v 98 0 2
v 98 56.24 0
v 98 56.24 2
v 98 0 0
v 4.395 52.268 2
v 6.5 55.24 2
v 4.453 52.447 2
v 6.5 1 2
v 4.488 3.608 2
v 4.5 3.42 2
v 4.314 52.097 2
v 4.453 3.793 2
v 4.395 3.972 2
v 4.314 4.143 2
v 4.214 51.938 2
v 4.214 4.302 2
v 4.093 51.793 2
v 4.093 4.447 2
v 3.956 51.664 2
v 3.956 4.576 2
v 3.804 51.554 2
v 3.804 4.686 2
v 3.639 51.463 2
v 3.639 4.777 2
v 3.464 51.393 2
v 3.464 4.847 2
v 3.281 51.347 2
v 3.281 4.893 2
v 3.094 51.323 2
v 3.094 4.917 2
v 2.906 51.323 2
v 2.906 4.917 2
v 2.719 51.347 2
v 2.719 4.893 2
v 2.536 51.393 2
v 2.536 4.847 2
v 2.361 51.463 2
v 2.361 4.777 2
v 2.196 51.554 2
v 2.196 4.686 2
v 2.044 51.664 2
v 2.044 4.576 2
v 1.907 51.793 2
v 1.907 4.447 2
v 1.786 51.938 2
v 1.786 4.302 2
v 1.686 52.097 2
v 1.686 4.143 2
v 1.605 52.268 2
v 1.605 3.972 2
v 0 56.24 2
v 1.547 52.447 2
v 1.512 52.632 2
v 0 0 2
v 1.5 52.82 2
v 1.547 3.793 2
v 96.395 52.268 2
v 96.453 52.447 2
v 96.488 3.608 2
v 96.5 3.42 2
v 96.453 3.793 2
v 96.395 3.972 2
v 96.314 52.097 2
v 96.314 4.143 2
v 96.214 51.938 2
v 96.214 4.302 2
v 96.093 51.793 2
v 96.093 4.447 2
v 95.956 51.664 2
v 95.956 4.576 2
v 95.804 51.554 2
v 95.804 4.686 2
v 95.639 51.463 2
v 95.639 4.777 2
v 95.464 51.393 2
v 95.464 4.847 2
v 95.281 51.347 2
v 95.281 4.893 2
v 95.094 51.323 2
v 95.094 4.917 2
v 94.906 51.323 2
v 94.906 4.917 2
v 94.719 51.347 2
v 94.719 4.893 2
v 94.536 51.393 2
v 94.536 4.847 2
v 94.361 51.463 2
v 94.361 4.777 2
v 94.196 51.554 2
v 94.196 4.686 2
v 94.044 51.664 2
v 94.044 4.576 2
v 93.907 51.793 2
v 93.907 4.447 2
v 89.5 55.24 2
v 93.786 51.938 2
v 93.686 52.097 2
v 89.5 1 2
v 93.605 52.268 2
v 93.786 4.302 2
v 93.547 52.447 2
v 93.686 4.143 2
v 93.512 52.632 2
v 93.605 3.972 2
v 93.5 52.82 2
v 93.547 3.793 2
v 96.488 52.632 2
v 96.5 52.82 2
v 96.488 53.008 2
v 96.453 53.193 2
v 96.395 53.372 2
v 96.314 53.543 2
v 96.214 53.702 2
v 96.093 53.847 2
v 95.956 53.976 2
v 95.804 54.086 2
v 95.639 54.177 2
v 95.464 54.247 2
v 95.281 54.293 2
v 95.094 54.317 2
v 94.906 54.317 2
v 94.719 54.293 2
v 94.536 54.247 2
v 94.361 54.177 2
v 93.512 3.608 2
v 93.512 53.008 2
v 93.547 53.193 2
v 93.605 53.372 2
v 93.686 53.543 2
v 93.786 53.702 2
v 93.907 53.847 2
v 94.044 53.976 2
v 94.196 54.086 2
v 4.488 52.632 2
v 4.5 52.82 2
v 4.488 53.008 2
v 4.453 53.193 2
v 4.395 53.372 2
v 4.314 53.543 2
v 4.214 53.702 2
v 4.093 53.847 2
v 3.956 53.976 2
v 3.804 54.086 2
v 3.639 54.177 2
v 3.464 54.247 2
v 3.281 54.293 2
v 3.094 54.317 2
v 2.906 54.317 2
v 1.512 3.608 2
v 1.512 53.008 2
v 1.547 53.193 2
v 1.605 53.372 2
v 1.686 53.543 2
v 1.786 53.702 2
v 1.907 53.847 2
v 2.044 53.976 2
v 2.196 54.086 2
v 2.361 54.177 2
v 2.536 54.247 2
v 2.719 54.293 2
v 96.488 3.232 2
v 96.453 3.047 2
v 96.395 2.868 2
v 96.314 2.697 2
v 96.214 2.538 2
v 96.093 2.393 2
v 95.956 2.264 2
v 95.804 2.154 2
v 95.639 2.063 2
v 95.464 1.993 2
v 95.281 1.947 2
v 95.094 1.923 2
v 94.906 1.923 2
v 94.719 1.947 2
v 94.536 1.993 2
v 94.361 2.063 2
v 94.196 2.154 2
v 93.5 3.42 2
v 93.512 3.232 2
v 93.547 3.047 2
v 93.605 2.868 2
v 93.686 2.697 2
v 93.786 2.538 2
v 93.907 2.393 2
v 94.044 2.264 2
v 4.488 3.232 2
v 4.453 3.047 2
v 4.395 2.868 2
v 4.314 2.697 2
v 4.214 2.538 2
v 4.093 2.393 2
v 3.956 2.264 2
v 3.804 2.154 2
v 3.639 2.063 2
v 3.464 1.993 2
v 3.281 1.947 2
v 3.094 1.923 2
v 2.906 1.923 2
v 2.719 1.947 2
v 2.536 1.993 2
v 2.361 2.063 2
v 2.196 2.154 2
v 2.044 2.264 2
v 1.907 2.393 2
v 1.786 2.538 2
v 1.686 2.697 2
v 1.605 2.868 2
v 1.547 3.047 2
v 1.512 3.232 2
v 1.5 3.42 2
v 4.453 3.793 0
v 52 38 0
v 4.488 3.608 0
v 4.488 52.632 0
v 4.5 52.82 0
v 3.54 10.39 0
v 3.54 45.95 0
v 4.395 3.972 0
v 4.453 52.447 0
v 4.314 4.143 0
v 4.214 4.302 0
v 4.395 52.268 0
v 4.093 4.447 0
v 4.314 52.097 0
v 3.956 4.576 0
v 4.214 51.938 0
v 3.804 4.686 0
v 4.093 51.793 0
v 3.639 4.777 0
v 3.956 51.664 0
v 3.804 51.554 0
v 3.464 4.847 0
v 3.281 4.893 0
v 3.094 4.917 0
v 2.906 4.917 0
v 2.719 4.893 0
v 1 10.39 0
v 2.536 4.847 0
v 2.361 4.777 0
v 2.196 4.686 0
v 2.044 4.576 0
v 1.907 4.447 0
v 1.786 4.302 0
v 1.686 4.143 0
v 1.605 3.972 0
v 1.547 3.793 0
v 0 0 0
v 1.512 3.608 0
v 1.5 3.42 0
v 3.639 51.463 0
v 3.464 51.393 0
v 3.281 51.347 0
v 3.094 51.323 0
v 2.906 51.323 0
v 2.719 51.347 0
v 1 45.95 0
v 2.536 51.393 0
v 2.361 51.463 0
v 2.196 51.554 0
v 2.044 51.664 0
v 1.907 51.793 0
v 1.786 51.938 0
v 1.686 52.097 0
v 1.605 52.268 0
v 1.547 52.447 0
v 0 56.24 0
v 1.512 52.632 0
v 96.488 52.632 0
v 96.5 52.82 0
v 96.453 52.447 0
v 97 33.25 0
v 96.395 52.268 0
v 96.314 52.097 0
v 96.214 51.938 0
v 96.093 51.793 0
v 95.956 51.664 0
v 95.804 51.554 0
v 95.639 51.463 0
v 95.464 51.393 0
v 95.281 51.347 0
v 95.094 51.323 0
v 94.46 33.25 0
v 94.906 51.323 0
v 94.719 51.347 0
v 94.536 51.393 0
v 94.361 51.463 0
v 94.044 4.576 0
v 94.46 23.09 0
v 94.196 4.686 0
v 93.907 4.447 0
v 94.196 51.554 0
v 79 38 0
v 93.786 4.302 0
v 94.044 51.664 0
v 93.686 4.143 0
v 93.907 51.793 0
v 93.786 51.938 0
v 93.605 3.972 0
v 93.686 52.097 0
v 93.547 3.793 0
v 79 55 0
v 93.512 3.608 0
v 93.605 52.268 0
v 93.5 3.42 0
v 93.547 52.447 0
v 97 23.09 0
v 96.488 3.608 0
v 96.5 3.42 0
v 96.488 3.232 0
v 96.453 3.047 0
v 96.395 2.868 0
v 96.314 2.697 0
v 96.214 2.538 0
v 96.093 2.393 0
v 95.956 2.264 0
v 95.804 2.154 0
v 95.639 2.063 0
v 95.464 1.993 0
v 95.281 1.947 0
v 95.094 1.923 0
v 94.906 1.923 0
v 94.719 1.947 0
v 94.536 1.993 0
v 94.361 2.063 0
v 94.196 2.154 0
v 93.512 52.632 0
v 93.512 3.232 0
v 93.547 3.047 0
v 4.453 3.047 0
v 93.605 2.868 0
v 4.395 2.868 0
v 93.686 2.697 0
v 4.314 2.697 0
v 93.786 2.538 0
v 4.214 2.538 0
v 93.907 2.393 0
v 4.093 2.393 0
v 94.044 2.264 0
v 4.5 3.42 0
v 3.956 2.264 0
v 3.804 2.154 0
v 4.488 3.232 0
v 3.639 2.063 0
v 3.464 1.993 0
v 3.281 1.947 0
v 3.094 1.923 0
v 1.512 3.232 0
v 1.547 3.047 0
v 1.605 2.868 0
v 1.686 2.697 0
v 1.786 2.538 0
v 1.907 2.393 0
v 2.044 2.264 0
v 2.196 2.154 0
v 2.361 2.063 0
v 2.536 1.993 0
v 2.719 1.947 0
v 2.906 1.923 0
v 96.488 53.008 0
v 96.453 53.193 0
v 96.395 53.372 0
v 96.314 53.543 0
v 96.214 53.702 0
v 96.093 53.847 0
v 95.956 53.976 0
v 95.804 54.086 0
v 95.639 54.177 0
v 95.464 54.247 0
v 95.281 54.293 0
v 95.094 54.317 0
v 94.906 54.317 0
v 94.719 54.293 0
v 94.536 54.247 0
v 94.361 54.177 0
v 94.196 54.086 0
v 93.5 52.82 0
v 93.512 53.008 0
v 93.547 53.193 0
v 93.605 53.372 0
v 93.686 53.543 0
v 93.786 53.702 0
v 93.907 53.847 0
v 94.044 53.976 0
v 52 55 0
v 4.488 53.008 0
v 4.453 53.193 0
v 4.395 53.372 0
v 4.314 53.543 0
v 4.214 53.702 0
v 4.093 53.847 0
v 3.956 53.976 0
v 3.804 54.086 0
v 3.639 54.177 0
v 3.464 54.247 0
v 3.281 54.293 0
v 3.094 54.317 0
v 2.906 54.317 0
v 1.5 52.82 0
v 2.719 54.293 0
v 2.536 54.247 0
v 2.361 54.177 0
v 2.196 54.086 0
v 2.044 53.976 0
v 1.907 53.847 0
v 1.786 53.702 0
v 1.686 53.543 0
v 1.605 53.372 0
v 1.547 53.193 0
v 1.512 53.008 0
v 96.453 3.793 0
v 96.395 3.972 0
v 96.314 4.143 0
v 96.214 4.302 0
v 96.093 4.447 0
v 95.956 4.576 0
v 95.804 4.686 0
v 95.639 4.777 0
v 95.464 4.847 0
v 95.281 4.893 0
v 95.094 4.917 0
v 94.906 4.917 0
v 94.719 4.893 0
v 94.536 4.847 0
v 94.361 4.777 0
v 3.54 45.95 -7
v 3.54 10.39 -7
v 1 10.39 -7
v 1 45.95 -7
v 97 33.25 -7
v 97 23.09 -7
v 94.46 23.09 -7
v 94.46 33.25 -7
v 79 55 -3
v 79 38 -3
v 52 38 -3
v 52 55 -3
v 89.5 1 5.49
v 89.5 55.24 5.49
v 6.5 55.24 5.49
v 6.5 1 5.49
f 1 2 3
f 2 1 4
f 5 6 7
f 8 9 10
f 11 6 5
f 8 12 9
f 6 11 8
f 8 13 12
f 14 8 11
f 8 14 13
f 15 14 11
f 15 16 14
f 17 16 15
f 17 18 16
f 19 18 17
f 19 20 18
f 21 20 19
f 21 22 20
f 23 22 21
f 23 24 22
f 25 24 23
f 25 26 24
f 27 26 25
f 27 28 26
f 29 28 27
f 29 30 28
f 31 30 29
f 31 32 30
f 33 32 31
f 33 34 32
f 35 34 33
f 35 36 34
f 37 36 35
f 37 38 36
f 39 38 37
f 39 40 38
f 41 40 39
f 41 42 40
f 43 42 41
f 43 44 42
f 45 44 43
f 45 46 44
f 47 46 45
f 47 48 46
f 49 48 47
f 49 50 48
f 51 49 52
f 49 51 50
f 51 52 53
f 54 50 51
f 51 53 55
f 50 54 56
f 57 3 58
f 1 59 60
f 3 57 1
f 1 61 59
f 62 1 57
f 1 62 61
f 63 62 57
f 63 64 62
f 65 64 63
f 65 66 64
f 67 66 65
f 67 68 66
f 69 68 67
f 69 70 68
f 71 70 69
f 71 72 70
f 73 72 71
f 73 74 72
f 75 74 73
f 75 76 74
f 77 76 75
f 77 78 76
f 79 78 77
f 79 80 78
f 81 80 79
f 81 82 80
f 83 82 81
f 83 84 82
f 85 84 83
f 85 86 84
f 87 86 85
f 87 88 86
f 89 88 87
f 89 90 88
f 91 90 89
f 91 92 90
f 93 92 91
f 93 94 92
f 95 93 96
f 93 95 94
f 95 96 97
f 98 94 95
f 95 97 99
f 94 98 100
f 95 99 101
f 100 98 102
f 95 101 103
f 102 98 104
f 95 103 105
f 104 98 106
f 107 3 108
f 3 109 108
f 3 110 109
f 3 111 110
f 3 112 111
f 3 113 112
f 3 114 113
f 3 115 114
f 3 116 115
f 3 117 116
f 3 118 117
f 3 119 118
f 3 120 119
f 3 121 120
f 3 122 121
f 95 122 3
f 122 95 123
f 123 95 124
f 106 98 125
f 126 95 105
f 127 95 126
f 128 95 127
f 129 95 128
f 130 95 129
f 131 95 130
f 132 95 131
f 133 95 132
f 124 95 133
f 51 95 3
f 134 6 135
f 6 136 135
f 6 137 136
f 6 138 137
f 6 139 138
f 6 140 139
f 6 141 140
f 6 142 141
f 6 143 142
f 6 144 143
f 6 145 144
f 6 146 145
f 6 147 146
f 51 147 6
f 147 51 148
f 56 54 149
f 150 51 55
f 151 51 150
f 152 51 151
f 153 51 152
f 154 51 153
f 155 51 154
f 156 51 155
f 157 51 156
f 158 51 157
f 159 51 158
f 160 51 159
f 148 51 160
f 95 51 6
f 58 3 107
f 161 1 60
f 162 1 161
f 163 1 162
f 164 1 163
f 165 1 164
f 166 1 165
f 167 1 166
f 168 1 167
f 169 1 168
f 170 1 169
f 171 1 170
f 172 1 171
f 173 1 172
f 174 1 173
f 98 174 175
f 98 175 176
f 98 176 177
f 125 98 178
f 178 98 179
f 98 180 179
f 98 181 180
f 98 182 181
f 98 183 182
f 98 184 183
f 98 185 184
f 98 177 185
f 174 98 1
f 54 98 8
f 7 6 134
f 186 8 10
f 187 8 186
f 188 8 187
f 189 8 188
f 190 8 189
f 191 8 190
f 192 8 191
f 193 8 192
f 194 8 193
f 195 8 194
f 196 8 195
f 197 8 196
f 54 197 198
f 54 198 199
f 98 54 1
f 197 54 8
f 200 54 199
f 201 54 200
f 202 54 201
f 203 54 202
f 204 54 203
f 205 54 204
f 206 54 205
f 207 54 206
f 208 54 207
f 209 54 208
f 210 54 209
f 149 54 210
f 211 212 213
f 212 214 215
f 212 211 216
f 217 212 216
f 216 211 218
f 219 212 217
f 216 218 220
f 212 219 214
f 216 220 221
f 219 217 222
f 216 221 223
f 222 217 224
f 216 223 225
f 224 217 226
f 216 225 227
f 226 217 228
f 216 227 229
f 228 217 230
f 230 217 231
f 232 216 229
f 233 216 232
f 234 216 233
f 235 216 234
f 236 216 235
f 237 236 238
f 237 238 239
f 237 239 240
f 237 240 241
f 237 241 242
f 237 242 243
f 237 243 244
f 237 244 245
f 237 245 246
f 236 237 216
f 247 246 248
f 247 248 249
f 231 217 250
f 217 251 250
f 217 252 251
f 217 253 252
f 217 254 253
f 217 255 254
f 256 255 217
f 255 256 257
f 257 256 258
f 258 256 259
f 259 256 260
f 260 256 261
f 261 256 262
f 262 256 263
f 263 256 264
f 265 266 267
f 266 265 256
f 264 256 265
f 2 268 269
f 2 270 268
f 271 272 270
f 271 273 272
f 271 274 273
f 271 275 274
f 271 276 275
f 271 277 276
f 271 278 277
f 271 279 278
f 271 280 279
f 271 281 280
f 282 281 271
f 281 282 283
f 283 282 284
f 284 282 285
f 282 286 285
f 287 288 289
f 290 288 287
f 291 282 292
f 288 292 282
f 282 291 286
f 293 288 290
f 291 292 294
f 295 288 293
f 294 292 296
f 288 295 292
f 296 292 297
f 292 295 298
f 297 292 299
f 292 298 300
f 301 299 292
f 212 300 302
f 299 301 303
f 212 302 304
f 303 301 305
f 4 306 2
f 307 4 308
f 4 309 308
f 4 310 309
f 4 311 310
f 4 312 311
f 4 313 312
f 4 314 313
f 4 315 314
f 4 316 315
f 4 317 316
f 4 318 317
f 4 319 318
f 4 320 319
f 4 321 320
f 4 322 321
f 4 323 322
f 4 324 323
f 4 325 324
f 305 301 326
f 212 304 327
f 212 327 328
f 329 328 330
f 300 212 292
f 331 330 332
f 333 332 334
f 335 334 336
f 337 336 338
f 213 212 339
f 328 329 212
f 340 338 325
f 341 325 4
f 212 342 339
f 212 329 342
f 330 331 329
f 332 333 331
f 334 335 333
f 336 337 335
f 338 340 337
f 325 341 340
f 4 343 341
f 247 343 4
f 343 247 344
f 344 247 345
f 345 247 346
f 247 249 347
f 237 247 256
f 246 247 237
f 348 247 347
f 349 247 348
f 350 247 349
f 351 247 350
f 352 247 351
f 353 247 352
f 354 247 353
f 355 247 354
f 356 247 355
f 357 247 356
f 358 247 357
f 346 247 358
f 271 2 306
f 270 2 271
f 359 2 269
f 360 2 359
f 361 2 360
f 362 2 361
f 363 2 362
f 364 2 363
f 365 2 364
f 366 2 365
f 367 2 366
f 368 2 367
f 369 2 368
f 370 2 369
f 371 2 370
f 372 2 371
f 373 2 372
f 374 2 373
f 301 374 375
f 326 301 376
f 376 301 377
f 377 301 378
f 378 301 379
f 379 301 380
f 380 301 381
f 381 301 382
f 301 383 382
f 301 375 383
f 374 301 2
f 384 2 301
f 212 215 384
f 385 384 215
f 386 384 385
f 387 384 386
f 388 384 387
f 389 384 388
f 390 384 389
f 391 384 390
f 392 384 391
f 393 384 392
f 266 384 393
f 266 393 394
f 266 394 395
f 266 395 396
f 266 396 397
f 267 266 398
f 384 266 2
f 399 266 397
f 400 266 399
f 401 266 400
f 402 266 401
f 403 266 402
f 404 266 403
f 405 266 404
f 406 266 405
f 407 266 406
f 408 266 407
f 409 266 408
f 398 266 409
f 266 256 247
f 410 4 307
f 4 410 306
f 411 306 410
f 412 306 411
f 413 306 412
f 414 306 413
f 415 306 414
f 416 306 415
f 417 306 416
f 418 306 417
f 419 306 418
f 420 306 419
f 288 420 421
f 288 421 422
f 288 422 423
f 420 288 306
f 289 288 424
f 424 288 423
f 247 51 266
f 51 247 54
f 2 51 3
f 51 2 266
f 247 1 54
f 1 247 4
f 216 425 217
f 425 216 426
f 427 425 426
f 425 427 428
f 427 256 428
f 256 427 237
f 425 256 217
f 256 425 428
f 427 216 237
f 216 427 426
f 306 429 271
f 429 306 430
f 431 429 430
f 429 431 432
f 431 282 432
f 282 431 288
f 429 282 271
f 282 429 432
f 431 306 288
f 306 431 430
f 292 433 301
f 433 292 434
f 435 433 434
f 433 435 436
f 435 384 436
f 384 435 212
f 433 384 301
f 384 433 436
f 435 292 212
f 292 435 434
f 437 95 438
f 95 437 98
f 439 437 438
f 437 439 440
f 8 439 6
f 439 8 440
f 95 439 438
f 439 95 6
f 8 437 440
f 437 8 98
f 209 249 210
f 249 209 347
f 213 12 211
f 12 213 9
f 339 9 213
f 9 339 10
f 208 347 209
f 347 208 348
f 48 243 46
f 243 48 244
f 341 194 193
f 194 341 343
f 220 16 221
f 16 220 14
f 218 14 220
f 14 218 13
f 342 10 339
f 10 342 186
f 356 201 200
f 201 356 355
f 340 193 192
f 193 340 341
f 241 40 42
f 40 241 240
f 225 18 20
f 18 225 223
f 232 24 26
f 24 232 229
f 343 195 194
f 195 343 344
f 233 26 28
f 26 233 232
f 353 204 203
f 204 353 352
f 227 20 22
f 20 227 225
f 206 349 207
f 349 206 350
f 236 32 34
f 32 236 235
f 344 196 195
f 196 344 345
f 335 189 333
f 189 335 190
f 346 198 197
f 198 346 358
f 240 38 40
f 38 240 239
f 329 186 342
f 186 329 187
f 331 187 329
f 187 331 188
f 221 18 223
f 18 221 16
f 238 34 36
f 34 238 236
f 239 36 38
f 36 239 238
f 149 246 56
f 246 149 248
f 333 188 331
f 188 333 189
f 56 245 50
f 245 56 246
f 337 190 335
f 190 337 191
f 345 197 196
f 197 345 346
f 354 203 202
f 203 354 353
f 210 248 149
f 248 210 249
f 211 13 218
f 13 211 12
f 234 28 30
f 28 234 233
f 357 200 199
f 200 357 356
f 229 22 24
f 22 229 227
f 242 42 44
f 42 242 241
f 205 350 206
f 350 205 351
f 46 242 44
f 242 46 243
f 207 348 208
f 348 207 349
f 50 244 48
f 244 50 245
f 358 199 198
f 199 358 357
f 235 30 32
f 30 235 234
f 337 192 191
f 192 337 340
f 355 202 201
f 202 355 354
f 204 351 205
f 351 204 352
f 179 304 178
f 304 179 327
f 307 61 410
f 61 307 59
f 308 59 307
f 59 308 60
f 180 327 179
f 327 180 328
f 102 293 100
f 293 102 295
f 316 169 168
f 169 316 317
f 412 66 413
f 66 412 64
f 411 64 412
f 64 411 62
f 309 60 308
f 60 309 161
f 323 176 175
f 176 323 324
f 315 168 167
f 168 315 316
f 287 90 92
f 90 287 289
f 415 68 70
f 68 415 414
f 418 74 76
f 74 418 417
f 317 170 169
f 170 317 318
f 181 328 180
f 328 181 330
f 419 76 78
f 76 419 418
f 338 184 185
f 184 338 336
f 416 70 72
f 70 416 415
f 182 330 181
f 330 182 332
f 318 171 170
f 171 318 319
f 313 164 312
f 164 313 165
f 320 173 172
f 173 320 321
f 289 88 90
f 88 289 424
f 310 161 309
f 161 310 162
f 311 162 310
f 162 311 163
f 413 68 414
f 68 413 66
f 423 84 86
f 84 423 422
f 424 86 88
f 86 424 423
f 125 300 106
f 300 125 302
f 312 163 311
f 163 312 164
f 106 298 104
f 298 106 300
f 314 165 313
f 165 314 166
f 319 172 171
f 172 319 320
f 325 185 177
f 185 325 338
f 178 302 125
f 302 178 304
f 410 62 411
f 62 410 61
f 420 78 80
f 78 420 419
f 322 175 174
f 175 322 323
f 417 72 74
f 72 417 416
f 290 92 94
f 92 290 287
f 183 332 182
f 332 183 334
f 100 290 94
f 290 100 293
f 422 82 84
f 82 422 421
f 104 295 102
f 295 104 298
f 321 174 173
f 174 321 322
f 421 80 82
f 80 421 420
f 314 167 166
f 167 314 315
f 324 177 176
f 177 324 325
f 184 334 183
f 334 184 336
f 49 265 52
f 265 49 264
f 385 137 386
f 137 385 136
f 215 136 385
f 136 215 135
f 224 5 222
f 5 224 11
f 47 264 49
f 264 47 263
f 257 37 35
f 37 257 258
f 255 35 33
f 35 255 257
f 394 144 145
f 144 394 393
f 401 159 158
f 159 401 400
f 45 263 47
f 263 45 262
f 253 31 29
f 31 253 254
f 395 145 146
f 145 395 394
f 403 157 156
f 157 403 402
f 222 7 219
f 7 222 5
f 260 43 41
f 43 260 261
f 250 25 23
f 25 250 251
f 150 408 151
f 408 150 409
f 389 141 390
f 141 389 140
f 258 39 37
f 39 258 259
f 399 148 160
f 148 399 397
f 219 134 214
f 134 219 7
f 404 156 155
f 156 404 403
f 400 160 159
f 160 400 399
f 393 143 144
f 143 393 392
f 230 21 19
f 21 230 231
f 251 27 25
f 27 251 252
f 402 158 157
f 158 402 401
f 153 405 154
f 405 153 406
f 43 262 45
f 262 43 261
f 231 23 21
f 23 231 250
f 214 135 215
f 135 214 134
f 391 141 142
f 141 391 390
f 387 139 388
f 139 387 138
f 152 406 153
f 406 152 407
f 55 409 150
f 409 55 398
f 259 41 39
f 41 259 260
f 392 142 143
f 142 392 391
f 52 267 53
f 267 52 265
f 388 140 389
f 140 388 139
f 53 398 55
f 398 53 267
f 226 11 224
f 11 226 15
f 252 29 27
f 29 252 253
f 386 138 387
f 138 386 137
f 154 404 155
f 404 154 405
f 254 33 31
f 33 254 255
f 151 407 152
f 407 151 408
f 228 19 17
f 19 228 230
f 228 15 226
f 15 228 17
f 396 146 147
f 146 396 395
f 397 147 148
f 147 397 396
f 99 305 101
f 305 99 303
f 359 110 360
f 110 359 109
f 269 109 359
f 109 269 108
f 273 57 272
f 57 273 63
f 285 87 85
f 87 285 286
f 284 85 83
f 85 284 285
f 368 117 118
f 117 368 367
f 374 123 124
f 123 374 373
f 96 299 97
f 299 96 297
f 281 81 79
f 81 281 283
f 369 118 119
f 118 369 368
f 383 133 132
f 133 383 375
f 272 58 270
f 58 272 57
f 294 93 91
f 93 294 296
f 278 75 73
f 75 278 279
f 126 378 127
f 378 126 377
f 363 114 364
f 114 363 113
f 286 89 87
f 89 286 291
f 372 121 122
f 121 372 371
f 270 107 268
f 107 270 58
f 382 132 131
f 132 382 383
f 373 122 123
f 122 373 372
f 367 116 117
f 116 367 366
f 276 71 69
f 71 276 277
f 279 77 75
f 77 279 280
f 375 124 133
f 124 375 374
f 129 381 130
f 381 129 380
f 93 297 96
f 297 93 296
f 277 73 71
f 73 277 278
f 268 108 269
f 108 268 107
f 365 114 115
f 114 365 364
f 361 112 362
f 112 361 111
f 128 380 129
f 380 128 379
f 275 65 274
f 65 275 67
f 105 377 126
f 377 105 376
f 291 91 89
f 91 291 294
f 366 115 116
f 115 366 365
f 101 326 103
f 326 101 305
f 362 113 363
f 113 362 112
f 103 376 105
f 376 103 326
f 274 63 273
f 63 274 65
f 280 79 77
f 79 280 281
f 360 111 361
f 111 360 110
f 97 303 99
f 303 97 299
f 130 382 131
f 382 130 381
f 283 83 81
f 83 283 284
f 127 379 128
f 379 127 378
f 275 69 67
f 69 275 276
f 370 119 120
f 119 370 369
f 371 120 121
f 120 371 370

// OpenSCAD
// various LEDs and touchscreens

module ILI9488()
{
	difference() {
		union() {
			cube( [ 98, 56.24, 2 ] ) ;
			translate( [ 1, 10.39, -7 ] ) cube( [ 2.54, 35.56, 8 ]) ;
			translate( [ 94.46, 23.09, -7 ] )
				cube( [ 2.54, 10.16, 8 ]) ;
			translate( [ 52, 38, -3 ] ) cube( [ 27, 17, 4 ] ) ;
			translate( [ 6.5, 1, 1.99 ] )
				cube( [ 83.00, 54.24, 3.5] ) ;
		}
		union() {
			translate( [3, 3.42, -1] ) cylinder( 5, d=3, $fn=50) ;
			translate( [95, 3.42, -1] ) cylinder( 5, d=3, $fn=50) ;
			translate( [3, 52.82, -1] ) cylinder( 5, d=3, $fn=50) ;
			translate( [95, 52.82, -1] ) cylinder( 5, d=3, $fn=50) ;
		}
	}
}

ILI9488() ;
